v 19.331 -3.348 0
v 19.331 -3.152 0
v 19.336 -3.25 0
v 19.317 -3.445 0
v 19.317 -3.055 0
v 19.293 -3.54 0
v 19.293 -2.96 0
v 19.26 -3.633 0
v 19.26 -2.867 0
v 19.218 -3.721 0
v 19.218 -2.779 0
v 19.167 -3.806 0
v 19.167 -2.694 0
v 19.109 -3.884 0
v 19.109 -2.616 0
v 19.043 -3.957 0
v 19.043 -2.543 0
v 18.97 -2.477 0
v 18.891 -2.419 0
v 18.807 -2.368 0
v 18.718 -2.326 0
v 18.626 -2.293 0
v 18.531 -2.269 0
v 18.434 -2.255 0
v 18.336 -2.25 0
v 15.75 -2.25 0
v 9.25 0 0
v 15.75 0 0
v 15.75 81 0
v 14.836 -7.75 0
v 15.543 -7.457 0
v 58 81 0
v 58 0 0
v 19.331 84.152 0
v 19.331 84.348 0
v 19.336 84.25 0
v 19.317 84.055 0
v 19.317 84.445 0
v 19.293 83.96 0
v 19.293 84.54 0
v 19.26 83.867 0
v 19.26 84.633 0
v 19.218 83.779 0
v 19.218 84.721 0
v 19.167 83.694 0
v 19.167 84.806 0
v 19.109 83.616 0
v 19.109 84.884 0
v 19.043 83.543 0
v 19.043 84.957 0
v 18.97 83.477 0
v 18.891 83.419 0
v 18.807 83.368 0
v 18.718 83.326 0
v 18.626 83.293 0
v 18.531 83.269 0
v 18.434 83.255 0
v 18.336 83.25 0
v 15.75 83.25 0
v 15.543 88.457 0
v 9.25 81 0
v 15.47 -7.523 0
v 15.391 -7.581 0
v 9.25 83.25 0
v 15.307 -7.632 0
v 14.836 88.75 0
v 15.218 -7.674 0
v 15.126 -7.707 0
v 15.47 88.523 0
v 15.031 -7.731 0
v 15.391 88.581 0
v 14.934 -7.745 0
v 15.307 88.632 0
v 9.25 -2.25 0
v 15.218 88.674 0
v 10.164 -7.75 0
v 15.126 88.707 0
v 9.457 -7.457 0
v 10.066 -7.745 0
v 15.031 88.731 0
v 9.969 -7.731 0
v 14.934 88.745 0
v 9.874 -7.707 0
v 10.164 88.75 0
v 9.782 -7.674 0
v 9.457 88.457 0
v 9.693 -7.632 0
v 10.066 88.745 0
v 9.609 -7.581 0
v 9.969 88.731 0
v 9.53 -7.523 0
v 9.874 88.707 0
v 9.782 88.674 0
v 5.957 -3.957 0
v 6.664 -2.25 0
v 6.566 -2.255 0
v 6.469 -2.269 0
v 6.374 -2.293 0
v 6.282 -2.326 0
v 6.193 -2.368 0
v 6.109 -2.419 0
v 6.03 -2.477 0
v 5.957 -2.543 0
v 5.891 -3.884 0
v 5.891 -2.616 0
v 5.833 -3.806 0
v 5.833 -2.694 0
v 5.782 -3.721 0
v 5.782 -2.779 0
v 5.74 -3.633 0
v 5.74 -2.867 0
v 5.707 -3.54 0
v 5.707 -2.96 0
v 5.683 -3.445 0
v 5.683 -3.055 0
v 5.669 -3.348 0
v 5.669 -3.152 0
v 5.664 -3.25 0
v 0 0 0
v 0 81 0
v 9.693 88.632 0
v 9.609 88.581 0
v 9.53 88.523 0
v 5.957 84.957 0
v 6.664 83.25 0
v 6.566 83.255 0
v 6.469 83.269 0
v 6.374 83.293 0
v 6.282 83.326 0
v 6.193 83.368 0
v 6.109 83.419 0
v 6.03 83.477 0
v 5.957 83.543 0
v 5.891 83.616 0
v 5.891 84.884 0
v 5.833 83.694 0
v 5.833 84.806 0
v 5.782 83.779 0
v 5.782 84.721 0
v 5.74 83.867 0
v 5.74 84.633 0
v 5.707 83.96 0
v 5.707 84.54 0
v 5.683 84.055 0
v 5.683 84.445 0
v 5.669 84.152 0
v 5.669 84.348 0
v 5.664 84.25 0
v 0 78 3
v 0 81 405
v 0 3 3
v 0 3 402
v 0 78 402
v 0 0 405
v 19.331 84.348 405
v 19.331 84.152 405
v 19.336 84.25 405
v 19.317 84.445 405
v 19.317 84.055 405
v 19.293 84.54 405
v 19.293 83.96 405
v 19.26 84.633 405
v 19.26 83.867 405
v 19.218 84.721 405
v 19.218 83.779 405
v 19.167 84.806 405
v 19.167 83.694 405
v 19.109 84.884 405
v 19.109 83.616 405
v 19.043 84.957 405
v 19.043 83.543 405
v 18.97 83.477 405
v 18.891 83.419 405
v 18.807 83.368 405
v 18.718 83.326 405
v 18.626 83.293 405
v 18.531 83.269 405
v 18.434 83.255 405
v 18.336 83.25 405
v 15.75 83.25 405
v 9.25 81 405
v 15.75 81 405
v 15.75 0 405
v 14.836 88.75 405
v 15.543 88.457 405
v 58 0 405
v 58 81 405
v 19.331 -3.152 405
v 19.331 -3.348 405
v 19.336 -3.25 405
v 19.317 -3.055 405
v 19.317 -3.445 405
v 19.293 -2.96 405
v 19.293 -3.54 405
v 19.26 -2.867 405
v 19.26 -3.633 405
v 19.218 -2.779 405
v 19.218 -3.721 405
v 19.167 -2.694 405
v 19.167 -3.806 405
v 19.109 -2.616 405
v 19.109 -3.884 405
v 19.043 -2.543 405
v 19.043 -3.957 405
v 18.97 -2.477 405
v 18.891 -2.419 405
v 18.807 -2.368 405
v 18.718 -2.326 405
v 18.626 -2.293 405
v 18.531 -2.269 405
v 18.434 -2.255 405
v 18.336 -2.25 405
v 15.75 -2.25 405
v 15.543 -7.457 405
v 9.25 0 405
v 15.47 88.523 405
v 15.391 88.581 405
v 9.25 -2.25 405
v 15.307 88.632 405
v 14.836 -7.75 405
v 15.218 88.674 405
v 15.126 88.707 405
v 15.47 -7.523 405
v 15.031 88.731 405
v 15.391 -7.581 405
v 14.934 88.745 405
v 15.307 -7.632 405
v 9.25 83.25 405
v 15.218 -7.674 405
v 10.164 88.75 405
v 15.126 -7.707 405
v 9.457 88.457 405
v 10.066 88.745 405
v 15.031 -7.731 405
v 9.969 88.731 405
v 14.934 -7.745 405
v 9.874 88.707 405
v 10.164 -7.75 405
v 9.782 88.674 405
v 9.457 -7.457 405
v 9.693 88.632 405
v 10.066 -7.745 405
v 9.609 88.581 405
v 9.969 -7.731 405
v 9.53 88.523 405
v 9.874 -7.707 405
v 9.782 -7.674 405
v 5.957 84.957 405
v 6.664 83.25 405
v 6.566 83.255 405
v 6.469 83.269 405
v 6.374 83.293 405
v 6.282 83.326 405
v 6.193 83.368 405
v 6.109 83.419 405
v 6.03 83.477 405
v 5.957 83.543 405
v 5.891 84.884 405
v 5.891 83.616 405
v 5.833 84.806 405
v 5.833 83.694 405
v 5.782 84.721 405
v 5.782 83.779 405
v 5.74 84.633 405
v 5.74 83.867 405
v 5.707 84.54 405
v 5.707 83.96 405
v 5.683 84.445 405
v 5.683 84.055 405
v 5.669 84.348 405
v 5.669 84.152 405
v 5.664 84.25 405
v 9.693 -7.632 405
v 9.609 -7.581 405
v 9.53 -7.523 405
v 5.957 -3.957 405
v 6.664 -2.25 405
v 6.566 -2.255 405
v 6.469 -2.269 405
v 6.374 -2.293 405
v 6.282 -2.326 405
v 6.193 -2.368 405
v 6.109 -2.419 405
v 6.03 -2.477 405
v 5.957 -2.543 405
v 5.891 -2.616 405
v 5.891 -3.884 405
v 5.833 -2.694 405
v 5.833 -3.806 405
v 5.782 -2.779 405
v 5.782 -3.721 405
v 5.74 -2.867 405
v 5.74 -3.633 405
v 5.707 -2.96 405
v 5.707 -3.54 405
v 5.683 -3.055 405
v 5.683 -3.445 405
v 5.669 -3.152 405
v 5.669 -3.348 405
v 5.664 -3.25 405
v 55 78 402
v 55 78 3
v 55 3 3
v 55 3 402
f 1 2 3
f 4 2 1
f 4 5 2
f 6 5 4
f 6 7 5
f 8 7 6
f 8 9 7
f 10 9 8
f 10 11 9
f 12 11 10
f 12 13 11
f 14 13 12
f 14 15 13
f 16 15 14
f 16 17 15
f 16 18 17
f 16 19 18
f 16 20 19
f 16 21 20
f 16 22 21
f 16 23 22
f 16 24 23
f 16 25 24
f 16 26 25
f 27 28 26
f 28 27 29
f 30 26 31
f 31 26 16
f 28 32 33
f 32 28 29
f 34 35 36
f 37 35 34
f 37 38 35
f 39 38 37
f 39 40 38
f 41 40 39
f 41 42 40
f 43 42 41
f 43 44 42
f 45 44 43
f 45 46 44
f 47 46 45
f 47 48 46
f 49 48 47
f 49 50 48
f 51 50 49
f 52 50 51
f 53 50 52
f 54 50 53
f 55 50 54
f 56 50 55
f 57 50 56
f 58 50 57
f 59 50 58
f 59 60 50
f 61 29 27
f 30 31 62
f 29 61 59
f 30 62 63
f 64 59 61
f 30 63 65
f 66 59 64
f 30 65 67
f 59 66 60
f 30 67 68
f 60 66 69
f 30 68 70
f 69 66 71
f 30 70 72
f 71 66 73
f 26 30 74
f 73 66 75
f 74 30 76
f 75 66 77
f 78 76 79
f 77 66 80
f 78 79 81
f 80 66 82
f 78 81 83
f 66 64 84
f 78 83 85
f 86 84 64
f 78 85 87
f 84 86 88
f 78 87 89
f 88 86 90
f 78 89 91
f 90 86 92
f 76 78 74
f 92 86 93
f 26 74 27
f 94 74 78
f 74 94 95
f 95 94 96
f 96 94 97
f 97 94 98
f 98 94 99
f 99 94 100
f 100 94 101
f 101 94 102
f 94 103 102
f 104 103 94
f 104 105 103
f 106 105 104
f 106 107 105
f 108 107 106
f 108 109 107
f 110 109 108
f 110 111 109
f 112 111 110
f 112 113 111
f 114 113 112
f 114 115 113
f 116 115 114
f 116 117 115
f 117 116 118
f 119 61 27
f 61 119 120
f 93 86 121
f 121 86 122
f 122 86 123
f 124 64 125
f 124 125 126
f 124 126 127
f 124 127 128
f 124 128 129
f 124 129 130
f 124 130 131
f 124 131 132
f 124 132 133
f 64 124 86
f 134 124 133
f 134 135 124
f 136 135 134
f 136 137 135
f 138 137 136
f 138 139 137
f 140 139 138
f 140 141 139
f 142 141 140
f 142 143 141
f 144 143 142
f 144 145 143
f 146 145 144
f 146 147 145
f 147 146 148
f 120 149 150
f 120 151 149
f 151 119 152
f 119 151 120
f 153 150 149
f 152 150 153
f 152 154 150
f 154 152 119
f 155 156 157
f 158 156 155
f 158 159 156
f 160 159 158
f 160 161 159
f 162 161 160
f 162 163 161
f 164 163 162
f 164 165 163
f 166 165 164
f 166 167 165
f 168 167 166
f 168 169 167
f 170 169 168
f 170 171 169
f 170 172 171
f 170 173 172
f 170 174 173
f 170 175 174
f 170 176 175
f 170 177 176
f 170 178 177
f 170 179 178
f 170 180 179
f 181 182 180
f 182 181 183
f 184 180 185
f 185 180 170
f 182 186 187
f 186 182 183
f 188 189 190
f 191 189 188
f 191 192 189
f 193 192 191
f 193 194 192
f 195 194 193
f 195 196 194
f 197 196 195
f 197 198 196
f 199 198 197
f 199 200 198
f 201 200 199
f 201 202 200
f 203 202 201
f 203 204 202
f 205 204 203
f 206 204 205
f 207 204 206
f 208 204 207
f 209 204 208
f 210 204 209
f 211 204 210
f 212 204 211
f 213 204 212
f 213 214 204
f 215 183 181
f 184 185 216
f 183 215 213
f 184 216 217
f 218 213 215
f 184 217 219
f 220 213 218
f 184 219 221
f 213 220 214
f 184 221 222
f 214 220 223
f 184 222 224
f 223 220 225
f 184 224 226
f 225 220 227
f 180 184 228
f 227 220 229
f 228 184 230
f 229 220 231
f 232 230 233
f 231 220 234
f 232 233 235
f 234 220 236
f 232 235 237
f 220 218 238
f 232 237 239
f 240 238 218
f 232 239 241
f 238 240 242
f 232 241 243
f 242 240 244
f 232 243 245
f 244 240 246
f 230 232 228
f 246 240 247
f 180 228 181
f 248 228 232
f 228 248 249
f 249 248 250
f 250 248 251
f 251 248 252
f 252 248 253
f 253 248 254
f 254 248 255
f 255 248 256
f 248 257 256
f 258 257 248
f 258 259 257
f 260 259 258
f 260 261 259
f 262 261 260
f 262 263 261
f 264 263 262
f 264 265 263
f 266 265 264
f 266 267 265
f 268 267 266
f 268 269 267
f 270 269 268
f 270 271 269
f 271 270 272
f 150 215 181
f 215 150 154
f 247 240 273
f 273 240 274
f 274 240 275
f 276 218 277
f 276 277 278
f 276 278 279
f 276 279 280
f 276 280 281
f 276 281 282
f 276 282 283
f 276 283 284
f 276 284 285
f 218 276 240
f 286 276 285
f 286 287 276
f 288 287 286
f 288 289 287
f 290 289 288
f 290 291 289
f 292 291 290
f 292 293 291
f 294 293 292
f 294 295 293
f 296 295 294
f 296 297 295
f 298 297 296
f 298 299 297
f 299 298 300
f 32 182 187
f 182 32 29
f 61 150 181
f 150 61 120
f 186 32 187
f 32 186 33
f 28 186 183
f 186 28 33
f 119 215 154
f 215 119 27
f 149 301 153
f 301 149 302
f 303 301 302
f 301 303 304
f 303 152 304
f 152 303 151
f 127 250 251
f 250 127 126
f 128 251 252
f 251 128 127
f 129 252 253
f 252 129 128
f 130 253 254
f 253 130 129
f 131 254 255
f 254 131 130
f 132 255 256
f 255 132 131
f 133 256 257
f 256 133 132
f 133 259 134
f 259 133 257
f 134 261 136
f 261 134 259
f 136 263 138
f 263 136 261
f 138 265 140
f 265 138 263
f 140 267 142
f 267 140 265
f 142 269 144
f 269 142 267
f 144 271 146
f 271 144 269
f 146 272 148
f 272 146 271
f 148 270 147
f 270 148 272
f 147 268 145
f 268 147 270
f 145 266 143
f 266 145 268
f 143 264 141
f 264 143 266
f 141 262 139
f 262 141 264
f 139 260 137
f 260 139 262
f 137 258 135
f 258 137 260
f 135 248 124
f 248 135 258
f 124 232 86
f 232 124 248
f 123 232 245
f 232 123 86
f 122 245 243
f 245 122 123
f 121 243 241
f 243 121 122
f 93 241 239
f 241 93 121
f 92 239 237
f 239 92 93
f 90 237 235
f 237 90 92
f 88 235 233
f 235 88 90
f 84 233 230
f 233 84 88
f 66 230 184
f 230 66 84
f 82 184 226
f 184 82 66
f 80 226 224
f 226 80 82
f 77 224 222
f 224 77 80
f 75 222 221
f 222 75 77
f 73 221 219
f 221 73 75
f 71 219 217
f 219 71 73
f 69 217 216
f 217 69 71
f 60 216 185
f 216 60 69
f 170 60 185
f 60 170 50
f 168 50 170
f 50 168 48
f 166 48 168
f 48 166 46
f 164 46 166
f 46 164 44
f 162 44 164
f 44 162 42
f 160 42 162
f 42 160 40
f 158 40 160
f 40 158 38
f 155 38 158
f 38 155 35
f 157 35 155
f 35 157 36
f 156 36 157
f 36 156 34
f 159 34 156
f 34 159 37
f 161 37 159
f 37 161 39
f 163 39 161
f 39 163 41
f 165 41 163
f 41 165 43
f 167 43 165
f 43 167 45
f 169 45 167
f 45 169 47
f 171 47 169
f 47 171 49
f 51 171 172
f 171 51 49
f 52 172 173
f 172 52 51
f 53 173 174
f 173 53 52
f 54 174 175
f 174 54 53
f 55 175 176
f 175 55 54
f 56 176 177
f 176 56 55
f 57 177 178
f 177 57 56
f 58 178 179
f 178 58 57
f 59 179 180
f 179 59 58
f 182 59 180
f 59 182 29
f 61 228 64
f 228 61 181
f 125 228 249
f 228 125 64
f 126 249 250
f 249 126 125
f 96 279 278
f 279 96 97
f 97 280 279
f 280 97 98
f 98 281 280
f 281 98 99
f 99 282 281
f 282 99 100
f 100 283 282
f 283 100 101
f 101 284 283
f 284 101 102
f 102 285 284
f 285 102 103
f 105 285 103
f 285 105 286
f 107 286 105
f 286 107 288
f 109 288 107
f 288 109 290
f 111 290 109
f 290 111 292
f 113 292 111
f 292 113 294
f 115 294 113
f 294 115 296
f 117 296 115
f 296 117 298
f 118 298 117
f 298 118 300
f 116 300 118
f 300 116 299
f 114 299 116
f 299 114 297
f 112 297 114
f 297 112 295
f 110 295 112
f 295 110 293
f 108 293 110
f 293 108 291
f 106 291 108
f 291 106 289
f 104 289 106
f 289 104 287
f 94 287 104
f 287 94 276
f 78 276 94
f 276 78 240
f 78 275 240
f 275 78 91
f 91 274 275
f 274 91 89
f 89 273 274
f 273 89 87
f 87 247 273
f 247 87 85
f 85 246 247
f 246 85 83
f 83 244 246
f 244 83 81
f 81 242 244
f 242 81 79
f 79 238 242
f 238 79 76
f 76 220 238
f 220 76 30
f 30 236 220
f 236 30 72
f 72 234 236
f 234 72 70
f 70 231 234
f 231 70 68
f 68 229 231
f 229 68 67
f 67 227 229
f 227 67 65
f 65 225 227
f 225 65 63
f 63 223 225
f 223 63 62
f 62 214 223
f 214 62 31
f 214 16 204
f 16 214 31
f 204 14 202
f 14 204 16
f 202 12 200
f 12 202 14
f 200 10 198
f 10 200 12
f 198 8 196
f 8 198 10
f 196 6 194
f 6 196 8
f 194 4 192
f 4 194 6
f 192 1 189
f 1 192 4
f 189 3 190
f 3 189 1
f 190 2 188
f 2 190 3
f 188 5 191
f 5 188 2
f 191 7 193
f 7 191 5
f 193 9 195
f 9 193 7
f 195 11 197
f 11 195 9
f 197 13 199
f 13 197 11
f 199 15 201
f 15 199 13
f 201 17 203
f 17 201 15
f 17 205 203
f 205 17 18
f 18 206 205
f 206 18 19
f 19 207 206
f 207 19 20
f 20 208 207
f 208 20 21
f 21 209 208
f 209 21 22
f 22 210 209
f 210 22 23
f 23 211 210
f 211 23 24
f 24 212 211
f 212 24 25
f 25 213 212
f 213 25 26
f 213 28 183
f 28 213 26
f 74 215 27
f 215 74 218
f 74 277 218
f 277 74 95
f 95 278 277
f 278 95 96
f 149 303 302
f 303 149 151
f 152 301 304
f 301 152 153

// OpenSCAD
// file: t-track.scad
function wSlot(type) =
  type == "25" ? 6.5 :
  undef;

function hSlot(type) =
  type == "25" ? 2.25 :
  undef;

function wChannel(type) =
  type == "25" ? [16.5, 5.5] :
  undef;

function hChannel(type) =
  type == "25" ? 5.5 :
  undef;

function rChannel(type) =
  type == "25" ? 1 :
  undef;

function wFrame(type) =
  type == "25" ? 25 :
  undef;

module Channel(type) {
  $fn = 64;
    sw = wSlot(type);
    sh = hSlot(type);
    cw = wChannel(type);
    ch = hChannel(type);
    r  = rChannel(type);

  translate([0, -sh]) {
    minkowski() {
      circle(r=1);
      offset(delta=-r) {
        polygon([
          [-cw[0]/2, 0],
          [ cw[0]/2, 0],
          [ cw[1]/2, -ch],
          [-cw[1]/2, -ch],
        ]);
      }
    }
    translate([-sw/2, 0])
      square([sw, sh]);
  }
}

Channel("25");
// main file
use <t-track.scad>

ctype = "25";

bed_w = 177;

// Radius of the interior of the caddy.
r          = 100;
th         =   3;
in_d       =  55;
in_h       =  75;
out_w      = 405;
conn_w     =  10;
out_d      =  in_d + th;
out_h      = th +in_h + th;
in_w       = out_w - th - th;
segments   = ceil(out_w / bed_w);
conn_step  = (out_w - conn_w) / segments;
conn_dzs = [for (i = [0 : conn_step : out_w]) i ];

module BotConnector() {
  linear_extrude(out_w) {
    translate([wFrame(ctype)/2, 0]) Channel(ctype);
  }
}

module TopConnector() {
  mirror([0, 1, 0]) BotConnector();
}

module Connectors() {
  translate([0, th+in_h+th]) {
    TopConnector();
  }
  BotConnector();
}

module Interior() {
  translate([-1, 0, -1]) linear_extrude(out_w+2) square([in_d+1, in_h]);
}

module Exterior() {
  linear_extrude(out_w) square([in_d+th, th+in_h+th]);
}

module Caddy() {
  difference() {
    Exterior();
    translate([0, th])
      Interior();
  }
  cube([out_d, out_h, th]);
  translate([0, 0, th+in_w])
    cube([out_d, out_h, th]);
  Connectors();
}

Caddy();
